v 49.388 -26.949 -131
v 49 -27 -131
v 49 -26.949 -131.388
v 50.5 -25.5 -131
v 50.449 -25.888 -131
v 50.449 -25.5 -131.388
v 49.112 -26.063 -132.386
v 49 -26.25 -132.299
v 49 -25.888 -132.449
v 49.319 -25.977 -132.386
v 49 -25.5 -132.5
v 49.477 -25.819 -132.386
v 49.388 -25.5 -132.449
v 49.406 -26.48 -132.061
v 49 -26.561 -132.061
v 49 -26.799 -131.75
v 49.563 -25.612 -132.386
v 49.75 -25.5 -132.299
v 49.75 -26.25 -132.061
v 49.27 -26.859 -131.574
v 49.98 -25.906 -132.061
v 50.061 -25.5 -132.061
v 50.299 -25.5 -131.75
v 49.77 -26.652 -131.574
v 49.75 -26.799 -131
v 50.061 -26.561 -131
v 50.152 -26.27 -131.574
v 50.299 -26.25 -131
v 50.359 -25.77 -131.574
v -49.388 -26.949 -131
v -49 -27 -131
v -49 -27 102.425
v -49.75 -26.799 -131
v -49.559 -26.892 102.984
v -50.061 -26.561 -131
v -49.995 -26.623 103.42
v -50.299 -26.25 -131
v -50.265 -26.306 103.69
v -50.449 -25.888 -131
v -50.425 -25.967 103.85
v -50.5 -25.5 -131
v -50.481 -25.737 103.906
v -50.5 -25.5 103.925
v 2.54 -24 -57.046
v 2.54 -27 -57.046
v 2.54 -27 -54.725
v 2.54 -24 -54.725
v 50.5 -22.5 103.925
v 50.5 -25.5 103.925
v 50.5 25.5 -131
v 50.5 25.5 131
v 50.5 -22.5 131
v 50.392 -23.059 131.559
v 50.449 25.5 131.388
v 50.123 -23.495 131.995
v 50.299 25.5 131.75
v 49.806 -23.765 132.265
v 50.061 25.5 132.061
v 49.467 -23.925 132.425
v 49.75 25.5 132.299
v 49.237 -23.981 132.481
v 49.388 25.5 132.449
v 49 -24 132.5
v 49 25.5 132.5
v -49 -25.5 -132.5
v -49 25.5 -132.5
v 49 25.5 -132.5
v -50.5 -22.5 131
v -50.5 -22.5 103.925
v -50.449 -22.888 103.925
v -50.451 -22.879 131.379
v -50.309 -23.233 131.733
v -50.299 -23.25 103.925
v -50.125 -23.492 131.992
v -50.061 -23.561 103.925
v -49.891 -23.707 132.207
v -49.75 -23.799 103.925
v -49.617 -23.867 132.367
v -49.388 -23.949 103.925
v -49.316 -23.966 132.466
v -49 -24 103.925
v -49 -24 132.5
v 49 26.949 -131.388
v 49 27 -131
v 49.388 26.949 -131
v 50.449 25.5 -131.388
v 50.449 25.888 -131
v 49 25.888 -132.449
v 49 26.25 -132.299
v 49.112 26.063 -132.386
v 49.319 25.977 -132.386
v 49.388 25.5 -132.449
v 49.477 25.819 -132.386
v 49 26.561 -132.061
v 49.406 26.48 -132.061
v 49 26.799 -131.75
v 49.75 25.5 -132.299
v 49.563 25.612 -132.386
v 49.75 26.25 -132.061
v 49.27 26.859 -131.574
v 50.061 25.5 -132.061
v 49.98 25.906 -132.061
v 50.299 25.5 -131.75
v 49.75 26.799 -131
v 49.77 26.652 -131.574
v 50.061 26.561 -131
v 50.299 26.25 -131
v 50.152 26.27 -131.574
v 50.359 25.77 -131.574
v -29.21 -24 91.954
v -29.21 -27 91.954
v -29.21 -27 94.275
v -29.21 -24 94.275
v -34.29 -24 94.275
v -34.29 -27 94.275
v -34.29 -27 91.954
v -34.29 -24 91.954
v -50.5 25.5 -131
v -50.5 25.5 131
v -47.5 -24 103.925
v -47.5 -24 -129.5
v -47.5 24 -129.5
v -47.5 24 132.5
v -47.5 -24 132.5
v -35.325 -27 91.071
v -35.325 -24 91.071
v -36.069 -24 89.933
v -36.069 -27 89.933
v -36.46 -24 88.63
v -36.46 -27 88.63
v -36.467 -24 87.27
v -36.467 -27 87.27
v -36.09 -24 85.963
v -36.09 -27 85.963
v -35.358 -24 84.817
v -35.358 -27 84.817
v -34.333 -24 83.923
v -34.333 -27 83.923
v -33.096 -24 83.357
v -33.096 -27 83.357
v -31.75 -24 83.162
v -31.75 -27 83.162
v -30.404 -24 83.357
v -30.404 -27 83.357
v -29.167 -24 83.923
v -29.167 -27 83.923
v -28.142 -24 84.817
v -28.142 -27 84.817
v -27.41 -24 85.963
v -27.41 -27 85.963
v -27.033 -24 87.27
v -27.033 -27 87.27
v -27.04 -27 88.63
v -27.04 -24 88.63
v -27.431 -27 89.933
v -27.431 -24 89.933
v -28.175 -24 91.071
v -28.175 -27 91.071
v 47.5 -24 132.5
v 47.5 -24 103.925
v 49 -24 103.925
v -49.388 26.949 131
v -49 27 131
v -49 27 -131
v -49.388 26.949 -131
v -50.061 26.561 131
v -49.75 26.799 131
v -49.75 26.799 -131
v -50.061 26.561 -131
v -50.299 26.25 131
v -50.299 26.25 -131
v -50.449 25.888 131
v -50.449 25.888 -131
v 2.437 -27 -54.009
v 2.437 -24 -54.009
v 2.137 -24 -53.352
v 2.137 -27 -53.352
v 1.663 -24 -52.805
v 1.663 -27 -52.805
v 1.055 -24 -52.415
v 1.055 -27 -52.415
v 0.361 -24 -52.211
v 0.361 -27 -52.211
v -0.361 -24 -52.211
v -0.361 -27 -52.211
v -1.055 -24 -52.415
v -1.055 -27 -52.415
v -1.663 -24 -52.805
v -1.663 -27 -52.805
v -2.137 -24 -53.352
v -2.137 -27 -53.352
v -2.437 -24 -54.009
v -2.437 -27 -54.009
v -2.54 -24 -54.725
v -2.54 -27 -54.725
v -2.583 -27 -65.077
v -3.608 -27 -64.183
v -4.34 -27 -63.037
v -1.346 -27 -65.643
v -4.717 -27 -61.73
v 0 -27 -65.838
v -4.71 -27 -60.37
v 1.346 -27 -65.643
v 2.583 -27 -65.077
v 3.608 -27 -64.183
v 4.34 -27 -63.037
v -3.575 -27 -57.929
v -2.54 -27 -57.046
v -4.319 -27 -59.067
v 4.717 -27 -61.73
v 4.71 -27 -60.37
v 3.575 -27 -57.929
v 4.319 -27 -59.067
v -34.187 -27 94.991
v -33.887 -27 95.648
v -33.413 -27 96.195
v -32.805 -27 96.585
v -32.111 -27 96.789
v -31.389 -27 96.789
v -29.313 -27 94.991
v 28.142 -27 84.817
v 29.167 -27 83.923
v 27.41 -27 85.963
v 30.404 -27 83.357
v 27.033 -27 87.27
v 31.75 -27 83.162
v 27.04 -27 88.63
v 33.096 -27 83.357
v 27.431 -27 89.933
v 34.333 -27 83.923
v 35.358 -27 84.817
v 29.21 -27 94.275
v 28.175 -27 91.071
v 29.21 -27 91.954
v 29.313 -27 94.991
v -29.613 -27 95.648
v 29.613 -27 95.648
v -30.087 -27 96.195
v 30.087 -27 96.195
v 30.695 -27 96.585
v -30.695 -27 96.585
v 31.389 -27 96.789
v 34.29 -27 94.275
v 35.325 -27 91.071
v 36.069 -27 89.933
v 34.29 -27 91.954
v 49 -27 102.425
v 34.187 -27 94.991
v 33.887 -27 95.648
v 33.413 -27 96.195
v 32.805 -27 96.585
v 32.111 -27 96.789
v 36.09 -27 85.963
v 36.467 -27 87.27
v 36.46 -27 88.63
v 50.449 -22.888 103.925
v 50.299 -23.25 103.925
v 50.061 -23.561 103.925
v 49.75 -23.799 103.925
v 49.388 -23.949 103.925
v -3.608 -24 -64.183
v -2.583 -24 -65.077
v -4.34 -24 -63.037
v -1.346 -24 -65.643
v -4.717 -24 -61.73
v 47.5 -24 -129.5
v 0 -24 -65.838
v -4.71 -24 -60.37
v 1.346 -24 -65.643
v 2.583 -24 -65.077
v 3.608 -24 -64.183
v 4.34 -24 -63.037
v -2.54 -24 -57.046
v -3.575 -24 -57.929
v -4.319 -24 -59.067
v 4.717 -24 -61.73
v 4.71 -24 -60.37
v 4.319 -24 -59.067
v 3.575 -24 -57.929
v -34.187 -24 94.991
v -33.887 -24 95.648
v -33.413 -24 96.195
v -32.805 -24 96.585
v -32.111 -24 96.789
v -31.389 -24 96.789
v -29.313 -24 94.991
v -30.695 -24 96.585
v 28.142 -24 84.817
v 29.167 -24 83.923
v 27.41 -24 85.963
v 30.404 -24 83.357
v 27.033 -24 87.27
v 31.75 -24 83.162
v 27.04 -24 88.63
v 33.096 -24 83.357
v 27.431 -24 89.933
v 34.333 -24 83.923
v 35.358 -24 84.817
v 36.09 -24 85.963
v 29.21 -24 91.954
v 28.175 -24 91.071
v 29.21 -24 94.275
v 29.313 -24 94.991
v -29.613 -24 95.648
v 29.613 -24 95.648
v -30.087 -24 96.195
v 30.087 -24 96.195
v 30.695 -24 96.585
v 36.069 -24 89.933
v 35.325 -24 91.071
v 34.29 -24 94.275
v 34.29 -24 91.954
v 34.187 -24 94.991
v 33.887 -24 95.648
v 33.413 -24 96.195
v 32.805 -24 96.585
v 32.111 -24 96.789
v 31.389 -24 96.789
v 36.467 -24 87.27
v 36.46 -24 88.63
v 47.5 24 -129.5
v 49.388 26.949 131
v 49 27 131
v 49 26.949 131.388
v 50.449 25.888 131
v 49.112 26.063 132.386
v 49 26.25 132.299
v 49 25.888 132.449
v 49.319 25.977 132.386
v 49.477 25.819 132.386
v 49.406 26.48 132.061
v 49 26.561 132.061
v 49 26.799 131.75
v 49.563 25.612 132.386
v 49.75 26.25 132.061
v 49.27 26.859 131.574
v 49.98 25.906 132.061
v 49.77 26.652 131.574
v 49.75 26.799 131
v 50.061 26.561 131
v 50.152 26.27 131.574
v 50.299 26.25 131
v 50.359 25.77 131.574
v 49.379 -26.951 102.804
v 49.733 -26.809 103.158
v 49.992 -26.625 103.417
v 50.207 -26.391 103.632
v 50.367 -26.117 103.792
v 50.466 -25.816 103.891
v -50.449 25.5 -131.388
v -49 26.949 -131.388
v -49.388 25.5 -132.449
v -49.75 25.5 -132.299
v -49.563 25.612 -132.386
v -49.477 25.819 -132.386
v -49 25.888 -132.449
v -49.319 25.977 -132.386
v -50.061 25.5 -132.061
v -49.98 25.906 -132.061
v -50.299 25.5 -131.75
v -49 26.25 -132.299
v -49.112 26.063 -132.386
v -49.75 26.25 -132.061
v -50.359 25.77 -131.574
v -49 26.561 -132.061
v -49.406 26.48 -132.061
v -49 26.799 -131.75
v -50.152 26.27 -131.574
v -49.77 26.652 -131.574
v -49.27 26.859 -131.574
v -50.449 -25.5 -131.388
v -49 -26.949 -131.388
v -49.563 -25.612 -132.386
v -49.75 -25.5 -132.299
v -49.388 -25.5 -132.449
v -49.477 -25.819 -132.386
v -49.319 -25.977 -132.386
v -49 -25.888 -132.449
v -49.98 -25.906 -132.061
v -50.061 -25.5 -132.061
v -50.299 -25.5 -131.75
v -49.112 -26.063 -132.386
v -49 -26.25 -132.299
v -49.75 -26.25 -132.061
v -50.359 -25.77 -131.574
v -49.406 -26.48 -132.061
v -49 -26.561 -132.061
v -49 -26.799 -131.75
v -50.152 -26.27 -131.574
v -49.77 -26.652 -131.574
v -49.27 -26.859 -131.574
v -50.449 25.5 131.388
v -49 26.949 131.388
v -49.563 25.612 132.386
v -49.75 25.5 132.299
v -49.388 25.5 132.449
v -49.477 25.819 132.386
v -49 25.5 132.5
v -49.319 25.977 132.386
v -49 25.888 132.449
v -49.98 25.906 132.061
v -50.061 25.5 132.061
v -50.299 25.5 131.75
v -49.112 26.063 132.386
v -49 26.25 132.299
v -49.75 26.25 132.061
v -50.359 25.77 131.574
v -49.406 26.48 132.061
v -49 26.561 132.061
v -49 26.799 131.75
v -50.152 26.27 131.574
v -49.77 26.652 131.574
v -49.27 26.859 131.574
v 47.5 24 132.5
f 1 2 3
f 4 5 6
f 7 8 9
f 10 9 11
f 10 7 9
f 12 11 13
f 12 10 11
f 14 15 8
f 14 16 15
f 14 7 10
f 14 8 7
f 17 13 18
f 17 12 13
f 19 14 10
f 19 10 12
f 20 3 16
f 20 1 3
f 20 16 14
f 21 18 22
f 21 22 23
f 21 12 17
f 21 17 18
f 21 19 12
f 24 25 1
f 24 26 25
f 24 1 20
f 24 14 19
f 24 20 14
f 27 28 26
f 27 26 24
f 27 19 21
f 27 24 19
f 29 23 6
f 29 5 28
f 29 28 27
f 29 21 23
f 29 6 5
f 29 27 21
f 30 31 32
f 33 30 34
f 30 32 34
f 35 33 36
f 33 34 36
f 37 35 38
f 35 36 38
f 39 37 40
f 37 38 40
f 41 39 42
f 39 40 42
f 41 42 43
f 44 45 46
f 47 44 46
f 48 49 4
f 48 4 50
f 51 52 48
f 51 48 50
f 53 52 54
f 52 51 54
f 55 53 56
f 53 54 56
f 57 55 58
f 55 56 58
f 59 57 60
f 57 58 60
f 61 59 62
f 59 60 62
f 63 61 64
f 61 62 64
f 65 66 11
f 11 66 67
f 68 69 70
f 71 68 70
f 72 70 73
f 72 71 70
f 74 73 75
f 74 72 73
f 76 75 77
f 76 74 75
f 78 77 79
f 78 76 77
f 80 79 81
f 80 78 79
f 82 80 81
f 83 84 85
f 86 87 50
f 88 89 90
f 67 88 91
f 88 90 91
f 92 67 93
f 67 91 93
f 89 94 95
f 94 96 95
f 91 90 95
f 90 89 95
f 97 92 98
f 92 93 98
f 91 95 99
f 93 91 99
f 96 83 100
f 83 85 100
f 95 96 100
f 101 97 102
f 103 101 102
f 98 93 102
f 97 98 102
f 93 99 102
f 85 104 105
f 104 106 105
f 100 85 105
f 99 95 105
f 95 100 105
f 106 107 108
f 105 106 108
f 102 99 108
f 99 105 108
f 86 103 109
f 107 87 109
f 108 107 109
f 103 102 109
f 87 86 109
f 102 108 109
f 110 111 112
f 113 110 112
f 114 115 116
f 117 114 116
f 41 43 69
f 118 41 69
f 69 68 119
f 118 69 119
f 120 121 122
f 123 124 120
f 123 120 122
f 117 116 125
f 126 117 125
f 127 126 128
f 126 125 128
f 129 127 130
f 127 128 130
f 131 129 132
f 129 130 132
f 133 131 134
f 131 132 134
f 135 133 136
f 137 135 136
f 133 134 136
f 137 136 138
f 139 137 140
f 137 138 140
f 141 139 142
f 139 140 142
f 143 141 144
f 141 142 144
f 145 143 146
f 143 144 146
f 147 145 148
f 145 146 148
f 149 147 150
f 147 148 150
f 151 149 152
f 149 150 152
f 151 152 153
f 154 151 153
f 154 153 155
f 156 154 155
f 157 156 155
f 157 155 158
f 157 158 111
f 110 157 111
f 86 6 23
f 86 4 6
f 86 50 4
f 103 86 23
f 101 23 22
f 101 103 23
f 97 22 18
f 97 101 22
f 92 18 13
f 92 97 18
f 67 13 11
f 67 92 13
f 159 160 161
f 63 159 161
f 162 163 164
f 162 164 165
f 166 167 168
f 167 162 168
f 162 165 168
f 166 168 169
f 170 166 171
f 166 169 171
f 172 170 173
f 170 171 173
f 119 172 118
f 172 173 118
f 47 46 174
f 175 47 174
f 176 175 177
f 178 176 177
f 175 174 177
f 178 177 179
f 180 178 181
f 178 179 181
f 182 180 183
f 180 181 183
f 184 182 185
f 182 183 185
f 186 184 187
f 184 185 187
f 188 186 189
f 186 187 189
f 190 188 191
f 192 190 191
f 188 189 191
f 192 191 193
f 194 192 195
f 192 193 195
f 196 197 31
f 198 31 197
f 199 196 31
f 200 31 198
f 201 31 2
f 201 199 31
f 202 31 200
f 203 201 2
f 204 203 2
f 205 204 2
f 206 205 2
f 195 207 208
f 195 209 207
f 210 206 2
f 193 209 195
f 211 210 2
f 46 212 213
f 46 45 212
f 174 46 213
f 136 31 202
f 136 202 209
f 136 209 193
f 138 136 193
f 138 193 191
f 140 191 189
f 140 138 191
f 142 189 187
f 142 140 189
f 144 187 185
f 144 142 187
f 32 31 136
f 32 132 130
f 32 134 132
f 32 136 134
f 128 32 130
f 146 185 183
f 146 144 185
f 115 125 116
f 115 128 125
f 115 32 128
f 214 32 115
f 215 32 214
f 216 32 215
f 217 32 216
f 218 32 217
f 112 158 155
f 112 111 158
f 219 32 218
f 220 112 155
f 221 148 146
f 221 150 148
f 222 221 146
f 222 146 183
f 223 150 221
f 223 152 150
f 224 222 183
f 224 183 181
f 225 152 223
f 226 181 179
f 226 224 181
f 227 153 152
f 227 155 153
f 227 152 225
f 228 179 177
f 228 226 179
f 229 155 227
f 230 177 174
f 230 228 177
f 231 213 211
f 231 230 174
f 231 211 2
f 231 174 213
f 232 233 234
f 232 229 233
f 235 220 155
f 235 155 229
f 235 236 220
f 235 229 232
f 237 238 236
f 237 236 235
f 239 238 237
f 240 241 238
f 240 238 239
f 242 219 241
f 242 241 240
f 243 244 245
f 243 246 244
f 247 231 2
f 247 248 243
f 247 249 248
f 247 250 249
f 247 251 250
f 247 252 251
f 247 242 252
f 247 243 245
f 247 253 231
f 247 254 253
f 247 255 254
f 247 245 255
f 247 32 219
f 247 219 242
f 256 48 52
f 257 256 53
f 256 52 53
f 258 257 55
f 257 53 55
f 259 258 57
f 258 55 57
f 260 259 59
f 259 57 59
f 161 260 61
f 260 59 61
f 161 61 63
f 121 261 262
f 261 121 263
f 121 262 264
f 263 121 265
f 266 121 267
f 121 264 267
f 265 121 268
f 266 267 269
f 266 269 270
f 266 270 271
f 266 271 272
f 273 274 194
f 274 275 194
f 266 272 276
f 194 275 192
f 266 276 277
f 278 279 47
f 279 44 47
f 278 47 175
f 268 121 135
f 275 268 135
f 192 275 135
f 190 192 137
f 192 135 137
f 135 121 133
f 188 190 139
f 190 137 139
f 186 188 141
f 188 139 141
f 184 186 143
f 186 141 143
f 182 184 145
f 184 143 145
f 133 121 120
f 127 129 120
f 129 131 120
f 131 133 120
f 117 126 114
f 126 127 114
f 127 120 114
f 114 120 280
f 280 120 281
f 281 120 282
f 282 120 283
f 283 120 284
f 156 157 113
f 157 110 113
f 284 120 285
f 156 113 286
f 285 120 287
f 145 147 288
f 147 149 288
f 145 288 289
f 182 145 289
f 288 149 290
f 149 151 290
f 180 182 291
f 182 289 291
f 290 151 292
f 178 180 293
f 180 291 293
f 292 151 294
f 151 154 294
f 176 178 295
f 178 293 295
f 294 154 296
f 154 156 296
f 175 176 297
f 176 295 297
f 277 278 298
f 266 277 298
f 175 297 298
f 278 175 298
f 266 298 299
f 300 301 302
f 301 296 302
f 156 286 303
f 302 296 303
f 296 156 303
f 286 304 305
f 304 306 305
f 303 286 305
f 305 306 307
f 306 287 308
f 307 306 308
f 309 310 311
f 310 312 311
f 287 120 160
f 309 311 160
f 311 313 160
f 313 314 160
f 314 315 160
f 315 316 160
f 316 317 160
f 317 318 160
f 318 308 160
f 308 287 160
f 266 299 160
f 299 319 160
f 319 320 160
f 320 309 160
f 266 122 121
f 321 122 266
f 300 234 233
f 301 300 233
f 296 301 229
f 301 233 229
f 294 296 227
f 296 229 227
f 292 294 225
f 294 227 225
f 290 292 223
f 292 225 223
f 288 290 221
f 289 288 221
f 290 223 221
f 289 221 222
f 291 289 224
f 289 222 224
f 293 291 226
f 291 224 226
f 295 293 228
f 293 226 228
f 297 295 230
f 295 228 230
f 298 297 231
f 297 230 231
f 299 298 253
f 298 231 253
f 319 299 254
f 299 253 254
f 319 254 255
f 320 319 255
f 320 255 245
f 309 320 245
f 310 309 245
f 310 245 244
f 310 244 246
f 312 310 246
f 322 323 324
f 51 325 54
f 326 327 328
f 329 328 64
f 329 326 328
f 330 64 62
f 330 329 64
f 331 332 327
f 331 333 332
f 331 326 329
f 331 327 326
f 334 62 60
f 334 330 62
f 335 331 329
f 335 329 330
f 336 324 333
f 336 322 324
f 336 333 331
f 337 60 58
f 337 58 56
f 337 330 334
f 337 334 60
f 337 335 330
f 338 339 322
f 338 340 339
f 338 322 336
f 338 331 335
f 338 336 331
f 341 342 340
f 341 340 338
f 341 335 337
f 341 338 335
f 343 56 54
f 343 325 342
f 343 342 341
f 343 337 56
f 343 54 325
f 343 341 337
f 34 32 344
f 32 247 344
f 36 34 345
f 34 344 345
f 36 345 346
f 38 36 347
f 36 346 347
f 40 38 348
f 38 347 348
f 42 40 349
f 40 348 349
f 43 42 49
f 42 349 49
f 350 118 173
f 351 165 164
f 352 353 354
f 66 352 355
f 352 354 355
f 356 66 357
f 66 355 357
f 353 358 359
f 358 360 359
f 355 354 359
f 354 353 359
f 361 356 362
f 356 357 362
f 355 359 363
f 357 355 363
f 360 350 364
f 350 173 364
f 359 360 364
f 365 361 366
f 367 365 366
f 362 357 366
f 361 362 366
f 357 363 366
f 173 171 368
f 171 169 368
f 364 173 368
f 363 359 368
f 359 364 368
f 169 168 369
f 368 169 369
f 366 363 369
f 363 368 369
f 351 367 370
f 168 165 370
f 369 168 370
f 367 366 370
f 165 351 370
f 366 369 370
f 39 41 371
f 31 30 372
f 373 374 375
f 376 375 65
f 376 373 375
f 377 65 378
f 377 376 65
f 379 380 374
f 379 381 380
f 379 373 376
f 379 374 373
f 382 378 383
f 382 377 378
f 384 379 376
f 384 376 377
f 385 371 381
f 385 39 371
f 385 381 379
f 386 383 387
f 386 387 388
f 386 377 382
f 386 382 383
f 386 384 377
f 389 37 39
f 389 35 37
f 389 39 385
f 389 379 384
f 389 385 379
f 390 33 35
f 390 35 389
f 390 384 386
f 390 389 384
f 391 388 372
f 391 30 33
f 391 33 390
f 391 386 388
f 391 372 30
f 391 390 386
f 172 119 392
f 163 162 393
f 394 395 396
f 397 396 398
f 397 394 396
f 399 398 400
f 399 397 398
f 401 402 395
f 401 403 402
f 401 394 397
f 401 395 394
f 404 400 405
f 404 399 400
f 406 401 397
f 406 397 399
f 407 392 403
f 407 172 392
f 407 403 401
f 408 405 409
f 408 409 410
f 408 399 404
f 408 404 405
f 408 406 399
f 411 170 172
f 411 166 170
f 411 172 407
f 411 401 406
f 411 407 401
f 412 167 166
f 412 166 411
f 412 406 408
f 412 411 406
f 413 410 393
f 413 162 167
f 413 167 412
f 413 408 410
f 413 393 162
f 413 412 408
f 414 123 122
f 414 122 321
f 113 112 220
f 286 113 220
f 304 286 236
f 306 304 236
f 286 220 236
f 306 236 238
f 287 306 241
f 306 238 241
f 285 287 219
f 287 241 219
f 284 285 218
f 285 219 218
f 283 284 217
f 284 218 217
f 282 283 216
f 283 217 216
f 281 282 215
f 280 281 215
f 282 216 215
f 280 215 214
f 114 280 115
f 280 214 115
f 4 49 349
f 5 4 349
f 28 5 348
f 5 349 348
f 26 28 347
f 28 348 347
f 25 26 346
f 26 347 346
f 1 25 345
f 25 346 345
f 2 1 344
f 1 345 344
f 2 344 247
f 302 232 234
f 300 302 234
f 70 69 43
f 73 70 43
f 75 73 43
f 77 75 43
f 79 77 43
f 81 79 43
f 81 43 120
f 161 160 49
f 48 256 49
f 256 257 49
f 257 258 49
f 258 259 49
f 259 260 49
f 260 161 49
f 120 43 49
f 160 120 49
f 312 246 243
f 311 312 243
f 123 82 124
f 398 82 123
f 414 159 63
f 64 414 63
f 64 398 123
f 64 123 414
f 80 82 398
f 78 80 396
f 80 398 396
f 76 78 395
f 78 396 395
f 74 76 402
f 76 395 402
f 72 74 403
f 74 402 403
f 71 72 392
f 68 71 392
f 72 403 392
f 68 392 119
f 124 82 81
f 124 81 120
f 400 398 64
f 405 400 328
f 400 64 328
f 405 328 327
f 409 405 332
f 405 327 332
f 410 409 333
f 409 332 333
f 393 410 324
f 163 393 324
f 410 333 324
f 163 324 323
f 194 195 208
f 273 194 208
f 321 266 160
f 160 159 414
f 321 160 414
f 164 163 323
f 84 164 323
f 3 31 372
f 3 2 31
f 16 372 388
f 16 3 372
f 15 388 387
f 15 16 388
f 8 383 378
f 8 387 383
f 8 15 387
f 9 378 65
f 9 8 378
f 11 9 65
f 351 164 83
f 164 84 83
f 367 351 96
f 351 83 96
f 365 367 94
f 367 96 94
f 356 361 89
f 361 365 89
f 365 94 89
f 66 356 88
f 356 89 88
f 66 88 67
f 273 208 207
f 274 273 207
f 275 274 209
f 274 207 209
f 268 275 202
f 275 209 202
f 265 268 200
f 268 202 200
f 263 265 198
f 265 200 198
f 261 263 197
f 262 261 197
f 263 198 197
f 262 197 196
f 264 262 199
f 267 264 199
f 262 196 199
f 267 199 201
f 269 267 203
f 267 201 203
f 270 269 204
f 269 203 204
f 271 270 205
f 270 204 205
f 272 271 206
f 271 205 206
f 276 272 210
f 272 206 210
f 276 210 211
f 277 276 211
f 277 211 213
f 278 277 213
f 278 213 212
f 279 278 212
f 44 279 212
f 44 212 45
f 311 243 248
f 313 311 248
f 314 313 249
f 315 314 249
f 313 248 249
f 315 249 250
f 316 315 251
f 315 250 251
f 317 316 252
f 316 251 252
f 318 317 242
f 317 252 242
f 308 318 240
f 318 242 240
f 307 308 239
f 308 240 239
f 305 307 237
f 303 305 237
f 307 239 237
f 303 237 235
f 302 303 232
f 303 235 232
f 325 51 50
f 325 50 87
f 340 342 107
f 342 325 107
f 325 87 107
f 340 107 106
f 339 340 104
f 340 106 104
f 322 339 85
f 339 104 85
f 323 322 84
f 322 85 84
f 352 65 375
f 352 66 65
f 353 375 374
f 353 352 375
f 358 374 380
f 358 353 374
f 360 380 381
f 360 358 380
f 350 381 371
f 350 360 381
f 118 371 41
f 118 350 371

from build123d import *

# Parameters (mm, degrees)
F0_W     = 101
F0_H     = 54
F1_DEPTH = 132.5
F2_T     = -3
F3_W     = 101
F3_H     = 28.575
F4_DEPTH = 3
F6_DEPTH = 3
F7_R     = 1.5


with BuildPart() as f1:
    # F0 (on Top) → F1 (new body, symmetric)
    with BuildSketch(Plane.XY):
        Rectangle(F0_W, F0_H)
    extrude(amount=F1_DEPTH, both=True)

    # F2
    f2_openings = [f1.faces().sort_by_distance(p)[0] for p in [
        (0, 0, 132.5),
    ]]
    offset(amount=F2_T, openings=f2_openings)

    # F3 (on face) → F4 (cut, through all)
    with BuildSketch(Plane.XZ.offset(27)):
        with Locations((0, 118.2125)):
            Rectangle(F3_W, F3_H)
    extrude(amount=-F4_DEPTH, mode=Mode.SUBTRACT)

    # F5 (on face) → F6 (cut, through all)
    with BuildSketch(Plane.XZ.offset(27)):
        with BuildLine():
            Line((-34.29, 94.275), (-34.29, 91.9536233691))
            ThreePointArc((-34.29, 91.9536233691), (-31.75, 83.1625), (-29.21, 91.9536233691))
            Line((-29.21, 91.9536233691), (-29.21, 94.275))
            ThreePointArc((-29.21, 94.275), (-31.75, 96.815), (-34.29, 94.275))
        make_face()
        with BuildLine():
            ThreePointArc((34.29, 94.275), (31.75, 96.815), (29.21, 94.275))
            Line((29.21, 94.275), (29.21, 91.9536233691))
            ThreePointArc((29.21, 91.9536233691), (31.75, 83.1625), (34.29, 91.9536233691))
            Line((34.29, 91.9536233691), (34.29, 94.275))
        make_face()
        with BuildLine():
            Line((-2.54, -54.725), (-2.54, -57.0463766309))
            ThreePointArc((-2.54, -57.0463766309), (0, -65.8375), (2.54, -57.0463766309))
            Line((2.54, -57.0463766309), (2.54, -54.725))
            ThreePointArc((2.54, -54.725), (0, -52.185), (-2.54, -54.725))
        make_face()
    extrude(amount=-F6_DEPTH, mode=Mode.SUBTRACT)

    # F7
    f7_edges = [f1.edges().sort_by_distance(p)[0] for p in [
        (50.5, -27, -14.2875),
        (50.5, 27, 0),
        (-50.5, -27, -14.2875),
        (-50.5, 27, 0),
        (-50.5, 0, -132.5),
        (0, 27, -132.5),
        (0, -27, -132.5),
        (50.5, 0, -132.5),
        (-50.5, 1.5, 132.5),
        (0, 27, 132.5),
        (50.5, 1.5, 132.5),
        (0, -27, 103.925),
        (-50.5, -24, 118.2125),
        (50.5, -24, 118.2125),
    ]]
    fillet(f7_edges, radius=F7_R)


solid = f1.part
